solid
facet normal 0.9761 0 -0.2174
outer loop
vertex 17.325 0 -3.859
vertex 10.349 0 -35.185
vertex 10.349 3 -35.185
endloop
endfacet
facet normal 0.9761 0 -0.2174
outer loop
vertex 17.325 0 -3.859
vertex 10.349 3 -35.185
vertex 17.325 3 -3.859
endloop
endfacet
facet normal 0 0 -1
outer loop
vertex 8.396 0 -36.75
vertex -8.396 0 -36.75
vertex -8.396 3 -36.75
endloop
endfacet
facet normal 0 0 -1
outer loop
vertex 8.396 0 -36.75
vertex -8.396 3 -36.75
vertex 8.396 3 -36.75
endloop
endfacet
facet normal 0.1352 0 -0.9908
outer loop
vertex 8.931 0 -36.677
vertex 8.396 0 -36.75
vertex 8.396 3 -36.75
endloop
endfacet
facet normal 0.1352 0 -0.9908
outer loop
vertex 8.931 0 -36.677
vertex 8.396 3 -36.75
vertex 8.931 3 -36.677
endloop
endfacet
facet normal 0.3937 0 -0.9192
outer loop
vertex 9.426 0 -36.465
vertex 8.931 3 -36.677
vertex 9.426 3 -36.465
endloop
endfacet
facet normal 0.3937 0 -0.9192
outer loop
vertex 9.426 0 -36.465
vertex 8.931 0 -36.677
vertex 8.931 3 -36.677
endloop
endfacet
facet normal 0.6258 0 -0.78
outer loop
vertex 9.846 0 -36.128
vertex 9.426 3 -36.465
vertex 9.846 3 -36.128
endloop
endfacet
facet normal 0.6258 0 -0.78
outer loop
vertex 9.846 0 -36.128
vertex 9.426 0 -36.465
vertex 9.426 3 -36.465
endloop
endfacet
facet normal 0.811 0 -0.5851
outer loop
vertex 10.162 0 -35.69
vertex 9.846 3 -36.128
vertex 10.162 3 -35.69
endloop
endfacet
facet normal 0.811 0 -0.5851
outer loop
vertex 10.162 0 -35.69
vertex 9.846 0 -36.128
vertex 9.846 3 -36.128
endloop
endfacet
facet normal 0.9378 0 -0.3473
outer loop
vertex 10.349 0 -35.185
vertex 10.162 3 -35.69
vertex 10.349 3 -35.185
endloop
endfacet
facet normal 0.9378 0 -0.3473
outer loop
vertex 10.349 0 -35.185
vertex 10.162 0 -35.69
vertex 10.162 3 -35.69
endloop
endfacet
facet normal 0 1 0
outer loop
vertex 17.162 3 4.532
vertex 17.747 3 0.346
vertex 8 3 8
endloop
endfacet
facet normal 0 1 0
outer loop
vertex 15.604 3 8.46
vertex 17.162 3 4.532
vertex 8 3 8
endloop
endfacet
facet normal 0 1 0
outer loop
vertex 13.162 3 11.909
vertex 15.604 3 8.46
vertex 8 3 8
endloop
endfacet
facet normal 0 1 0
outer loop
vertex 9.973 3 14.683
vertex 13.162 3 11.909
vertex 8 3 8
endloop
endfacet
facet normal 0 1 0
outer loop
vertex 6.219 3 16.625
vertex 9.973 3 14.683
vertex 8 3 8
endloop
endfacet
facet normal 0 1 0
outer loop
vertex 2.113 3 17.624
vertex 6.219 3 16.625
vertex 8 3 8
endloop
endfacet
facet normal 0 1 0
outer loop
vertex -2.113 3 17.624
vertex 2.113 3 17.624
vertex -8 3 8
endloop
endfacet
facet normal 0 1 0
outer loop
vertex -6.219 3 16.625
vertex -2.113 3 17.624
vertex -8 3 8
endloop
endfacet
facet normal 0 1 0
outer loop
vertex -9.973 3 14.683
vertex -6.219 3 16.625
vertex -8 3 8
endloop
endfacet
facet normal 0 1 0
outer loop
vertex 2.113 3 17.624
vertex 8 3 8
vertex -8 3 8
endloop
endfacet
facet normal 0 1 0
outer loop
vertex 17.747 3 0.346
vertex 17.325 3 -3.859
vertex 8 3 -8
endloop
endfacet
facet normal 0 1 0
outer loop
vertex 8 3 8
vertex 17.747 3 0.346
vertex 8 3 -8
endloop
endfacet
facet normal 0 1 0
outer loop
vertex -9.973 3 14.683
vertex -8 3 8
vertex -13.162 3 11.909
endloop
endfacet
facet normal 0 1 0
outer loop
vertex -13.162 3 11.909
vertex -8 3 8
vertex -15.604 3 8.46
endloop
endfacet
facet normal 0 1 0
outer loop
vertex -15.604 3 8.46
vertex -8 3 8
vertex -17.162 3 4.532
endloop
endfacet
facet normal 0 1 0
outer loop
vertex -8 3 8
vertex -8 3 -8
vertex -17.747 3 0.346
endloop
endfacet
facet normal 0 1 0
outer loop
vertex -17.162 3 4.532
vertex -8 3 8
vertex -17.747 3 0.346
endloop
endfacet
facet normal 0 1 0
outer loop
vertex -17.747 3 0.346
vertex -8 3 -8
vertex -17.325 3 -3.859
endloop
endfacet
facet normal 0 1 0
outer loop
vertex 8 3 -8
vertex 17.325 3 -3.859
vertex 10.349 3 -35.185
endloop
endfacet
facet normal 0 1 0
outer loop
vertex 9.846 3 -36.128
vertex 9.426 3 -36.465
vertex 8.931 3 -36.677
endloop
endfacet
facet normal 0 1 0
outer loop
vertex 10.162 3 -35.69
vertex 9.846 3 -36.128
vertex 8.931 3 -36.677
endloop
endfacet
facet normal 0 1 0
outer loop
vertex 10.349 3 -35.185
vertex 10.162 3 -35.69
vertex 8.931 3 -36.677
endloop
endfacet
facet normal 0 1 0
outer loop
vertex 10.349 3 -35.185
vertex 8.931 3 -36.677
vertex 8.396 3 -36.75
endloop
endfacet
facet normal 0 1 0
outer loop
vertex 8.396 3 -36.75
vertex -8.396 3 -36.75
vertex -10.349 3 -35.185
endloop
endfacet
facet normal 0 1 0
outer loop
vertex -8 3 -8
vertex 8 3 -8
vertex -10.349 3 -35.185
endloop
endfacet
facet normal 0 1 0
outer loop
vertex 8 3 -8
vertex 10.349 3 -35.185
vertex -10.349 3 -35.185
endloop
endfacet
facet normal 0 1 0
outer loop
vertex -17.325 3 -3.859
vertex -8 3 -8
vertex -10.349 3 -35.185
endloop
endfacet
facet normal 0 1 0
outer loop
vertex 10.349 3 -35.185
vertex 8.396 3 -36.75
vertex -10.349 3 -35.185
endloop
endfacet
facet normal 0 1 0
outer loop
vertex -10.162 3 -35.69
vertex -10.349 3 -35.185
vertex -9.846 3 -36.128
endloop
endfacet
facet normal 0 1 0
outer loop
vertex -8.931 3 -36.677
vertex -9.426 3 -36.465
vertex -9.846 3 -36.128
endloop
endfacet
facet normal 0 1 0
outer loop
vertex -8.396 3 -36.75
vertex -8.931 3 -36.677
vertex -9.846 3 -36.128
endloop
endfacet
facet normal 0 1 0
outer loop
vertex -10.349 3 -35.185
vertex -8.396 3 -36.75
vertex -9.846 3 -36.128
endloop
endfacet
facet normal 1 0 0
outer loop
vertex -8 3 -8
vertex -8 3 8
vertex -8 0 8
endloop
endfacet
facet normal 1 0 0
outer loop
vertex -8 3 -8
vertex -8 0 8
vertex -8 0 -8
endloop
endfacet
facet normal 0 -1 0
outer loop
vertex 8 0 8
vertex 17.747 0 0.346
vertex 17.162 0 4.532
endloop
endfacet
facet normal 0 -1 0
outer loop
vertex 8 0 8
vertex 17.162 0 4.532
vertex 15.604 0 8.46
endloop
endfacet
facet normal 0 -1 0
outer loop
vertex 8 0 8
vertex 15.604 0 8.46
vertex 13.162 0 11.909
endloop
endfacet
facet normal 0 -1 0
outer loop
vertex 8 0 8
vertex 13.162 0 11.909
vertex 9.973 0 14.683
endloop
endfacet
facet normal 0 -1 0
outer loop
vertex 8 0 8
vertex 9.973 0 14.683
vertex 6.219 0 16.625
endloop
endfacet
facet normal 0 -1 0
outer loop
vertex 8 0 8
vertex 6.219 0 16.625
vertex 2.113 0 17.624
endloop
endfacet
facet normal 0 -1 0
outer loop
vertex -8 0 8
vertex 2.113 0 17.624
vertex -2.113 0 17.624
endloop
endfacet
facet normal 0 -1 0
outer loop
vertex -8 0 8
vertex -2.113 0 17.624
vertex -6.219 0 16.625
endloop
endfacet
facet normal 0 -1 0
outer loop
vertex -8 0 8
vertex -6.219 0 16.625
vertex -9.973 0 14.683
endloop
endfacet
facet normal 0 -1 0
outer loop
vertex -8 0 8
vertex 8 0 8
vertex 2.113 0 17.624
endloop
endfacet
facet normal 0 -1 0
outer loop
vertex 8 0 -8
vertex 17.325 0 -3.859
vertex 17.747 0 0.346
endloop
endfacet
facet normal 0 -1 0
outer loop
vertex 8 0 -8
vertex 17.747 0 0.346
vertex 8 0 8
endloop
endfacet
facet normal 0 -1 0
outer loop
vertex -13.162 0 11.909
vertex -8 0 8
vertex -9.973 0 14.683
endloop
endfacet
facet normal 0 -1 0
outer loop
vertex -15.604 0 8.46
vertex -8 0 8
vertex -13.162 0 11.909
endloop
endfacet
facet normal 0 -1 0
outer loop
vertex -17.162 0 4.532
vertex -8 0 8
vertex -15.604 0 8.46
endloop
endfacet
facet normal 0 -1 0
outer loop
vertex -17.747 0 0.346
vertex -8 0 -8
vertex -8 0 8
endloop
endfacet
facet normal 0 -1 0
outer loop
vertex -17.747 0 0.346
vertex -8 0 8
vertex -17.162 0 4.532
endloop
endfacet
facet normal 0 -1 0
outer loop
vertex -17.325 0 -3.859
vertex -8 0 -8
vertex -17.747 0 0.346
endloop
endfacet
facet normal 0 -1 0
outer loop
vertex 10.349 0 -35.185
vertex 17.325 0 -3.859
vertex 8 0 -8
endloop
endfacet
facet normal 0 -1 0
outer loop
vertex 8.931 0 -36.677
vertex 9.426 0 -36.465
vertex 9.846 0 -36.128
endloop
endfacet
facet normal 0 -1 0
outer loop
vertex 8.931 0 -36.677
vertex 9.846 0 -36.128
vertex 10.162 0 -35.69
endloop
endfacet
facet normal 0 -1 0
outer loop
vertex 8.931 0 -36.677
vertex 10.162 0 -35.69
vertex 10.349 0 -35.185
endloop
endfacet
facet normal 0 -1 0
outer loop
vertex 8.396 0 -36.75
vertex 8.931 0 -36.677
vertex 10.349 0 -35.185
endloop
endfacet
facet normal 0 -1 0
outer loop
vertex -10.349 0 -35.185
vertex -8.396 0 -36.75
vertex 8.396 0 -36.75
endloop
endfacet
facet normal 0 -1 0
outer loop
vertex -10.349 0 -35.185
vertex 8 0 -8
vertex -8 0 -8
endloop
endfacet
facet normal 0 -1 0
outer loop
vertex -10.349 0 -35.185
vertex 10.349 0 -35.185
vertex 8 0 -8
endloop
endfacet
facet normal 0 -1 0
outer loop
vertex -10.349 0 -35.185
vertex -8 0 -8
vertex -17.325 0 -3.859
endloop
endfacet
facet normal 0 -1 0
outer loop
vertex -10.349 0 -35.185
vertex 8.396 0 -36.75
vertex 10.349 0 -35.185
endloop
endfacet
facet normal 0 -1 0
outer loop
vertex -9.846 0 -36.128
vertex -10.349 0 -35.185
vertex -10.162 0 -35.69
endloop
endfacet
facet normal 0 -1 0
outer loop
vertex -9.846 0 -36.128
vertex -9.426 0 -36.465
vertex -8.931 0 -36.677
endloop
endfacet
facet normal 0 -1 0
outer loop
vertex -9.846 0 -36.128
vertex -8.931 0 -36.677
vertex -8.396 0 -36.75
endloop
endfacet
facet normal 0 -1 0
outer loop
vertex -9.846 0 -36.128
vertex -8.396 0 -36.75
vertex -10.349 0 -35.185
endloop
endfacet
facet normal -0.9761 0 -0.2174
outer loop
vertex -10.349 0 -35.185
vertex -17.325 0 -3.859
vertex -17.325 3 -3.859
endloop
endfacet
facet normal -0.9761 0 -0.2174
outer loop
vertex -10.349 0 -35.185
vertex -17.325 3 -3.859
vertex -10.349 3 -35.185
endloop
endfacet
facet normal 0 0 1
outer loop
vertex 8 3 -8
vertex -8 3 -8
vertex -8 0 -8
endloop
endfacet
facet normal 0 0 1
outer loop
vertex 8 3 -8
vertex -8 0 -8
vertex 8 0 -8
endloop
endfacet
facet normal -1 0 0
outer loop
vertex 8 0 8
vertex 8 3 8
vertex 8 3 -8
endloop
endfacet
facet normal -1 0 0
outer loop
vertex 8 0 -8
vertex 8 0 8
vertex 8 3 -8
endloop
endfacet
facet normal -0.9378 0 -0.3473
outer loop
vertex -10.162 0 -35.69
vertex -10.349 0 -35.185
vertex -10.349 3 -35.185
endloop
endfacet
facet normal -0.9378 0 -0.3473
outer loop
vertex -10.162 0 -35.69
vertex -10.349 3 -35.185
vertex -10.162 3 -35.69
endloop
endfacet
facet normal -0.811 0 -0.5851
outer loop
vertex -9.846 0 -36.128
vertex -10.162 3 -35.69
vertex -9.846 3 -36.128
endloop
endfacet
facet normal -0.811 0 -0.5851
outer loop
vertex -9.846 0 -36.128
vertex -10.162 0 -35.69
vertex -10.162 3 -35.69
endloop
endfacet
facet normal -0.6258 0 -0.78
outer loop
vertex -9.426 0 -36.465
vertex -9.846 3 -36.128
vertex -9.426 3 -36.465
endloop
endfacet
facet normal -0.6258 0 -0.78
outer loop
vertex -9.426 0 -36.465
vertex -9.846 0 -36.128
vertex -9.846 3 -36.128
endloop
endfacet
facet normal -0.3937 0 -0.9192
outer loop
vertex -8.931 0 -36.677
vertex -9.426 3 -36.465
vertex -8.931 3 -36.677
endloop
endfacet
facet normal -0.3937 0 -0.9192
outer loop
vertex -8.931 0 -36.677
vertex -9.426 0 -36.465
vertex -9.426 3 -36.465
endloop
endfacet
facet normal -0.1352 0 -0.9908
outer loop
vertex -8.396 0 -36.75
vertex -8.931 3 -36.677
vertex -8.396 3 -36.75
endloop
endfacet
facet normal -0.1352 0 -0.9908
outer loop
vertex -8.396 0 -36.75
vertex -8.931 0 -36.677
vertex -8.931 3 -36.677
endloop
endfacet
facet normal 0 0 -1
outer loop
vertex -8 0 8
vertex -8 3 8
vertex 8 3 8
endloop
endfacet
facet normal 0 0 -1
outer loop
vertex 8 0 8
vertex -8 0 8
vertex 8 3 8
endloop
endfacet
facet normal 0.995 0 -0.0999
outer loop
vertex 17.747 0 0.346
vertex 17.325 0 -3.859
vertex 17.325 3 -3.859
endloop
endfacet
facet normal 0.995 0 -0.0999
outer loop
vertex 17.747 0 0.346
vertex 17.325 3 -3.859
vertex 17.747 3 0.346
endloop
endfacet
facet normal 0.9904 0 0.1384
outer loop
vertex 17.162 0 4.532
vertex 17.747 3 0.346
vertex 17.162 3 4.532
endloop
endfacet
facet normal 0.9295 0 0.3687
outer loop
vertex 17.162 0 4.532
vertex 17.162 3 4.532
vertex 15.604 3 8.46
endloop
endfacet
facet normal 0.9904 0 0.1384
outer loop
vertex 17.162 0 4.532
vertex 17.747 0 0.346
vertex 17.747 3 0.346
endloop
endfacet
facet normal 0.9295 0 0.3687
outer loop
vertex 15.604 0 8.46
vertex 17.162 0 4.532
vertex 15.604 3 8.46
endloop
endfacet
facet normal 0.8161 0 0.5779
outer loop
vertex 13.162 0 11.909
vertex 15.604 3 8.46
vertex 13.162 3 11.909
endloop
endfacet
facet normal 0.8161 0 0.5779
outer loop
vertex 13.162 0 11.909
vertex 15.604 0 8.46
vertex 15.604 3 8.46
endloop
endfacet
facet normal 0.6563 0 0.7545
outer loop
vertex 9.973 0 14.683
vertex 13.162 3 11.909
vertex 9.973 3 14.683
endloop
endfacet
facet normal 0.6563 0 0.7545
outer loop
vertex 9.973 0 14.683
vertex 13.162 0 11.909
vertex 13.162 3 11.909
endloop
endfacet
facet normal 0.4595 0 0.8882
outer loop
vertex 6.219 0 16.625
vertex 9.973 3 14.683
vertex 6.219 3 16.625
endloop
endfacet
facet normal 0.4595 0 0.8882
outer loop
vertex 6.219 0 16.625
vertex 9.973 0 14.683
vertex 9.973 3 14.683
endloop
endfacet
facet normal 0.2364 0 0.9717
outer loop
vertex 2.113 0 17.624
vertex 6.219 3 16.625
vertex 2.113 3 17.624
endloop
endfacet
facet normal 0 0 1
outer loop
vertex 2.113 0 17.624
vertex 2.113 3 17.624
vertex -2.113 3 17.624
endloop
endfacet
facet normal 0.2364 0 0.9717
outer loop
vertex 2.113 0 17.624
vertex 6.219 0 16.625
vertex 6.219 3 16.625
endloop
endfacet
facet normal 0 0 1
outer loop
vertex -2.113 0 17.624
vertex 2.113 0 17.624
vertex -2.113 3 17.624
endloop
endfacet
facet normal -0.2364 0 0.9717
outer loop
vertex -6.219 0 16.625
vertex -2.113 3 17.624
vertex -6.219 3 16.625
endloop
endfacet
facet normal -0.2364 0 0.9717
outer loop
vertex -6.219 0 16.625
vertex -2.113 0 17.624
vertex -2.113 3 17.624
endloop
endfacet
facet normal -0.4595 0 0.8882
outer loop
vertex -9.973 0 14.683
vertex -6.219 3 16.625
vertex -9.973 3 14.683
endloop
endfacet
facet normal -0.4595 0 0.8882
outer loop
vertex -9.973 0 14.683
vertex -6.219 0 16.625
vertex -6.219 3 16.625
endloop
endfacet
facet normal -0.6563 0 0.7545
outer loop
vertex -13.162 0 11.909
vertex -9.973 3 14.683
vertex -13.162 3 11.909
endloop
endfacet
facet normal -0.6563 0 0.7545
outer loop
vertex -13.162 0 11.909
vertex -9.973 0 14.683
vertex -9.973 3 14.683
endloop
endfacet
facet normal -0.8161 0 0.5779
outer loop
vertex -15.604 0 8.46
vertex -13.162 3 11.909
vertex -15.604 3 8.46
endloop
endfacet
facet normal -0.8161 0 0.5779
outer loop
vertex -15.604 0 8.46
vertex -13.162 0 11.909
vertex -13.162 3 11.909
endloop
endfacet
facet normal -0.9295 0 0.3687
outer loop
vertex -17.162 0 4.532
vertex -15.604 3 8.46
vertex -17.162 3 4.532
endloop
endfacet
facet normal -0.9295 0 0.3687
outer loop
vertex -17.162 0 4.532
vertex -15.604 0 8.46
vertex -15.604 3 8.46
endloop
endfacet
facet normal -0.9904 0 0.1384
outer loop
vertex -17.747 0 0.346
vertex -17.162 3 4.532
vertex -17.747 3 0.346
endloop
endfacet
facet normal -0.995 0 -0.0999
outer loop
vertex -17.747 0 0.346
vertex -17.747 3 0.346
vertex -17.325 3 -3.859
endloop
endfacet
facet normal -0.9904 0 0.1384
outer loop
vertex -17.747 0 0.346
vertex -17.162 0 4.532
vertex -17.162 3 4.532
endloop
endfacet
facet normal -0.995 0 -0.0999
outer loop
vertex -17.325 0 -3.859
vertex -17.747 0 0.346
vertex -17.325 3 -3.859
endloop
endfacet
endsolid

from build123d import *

# Parameters (mm, degrees)
BOSS_EXTRUDE1_DEPTH = 3
SKETCH2_W           = 16
SKETCH2_H           = 16
CUT_EXTRUDE1_DEPTH  = 3


with BuildPart() as part:
    # Sketch1 → Boss-Extrude1 (new body)
    with BuildSketch(Plane(origin=(0, 0, 0), x_dir=(1, 0, 0), z_dir=(0, 1, 0))):
        with BuildLine():
            Line((-8.396433729, 36.75), (8.396433729, 36.75))
            ThreePointArc((8.396433729, 36.75), (9.647519653, 36.310379445), (10.348602488, 35.184784011))
            Line((10.348602488, 35.184784011), (17.325497736, 3.858708099))
            ThreePointArc((17.325497736, 3.858708099), (0, -17.75), (-17.325497736, 3.858708099))
            Line((-17.325497736, 3.858708099), (-10.348602488, 35.184784011))
            ThreePointArc((-10.348602488, 35.184784011), (-9.647519653, 36.310379445), (-8.396433729, 36.75))
        make_face()
    extrude(amount=BOSS_EXTRUDE1_DEPTH)

    # Sketch2 → Cut-Extrude1 (cut)
    with BuildSketch(Plane(origin=(0, 3, 0), x_dir=(1, 0, 0), z_dir=(0, 1, 0))):
        Rectangle(SKETCH2_W, SKETCH2_H)
    extrude(amount=-CUT_EXTRUDE1_DEPTH, mode=Mode.SUBTRACT)


solid = part.part
